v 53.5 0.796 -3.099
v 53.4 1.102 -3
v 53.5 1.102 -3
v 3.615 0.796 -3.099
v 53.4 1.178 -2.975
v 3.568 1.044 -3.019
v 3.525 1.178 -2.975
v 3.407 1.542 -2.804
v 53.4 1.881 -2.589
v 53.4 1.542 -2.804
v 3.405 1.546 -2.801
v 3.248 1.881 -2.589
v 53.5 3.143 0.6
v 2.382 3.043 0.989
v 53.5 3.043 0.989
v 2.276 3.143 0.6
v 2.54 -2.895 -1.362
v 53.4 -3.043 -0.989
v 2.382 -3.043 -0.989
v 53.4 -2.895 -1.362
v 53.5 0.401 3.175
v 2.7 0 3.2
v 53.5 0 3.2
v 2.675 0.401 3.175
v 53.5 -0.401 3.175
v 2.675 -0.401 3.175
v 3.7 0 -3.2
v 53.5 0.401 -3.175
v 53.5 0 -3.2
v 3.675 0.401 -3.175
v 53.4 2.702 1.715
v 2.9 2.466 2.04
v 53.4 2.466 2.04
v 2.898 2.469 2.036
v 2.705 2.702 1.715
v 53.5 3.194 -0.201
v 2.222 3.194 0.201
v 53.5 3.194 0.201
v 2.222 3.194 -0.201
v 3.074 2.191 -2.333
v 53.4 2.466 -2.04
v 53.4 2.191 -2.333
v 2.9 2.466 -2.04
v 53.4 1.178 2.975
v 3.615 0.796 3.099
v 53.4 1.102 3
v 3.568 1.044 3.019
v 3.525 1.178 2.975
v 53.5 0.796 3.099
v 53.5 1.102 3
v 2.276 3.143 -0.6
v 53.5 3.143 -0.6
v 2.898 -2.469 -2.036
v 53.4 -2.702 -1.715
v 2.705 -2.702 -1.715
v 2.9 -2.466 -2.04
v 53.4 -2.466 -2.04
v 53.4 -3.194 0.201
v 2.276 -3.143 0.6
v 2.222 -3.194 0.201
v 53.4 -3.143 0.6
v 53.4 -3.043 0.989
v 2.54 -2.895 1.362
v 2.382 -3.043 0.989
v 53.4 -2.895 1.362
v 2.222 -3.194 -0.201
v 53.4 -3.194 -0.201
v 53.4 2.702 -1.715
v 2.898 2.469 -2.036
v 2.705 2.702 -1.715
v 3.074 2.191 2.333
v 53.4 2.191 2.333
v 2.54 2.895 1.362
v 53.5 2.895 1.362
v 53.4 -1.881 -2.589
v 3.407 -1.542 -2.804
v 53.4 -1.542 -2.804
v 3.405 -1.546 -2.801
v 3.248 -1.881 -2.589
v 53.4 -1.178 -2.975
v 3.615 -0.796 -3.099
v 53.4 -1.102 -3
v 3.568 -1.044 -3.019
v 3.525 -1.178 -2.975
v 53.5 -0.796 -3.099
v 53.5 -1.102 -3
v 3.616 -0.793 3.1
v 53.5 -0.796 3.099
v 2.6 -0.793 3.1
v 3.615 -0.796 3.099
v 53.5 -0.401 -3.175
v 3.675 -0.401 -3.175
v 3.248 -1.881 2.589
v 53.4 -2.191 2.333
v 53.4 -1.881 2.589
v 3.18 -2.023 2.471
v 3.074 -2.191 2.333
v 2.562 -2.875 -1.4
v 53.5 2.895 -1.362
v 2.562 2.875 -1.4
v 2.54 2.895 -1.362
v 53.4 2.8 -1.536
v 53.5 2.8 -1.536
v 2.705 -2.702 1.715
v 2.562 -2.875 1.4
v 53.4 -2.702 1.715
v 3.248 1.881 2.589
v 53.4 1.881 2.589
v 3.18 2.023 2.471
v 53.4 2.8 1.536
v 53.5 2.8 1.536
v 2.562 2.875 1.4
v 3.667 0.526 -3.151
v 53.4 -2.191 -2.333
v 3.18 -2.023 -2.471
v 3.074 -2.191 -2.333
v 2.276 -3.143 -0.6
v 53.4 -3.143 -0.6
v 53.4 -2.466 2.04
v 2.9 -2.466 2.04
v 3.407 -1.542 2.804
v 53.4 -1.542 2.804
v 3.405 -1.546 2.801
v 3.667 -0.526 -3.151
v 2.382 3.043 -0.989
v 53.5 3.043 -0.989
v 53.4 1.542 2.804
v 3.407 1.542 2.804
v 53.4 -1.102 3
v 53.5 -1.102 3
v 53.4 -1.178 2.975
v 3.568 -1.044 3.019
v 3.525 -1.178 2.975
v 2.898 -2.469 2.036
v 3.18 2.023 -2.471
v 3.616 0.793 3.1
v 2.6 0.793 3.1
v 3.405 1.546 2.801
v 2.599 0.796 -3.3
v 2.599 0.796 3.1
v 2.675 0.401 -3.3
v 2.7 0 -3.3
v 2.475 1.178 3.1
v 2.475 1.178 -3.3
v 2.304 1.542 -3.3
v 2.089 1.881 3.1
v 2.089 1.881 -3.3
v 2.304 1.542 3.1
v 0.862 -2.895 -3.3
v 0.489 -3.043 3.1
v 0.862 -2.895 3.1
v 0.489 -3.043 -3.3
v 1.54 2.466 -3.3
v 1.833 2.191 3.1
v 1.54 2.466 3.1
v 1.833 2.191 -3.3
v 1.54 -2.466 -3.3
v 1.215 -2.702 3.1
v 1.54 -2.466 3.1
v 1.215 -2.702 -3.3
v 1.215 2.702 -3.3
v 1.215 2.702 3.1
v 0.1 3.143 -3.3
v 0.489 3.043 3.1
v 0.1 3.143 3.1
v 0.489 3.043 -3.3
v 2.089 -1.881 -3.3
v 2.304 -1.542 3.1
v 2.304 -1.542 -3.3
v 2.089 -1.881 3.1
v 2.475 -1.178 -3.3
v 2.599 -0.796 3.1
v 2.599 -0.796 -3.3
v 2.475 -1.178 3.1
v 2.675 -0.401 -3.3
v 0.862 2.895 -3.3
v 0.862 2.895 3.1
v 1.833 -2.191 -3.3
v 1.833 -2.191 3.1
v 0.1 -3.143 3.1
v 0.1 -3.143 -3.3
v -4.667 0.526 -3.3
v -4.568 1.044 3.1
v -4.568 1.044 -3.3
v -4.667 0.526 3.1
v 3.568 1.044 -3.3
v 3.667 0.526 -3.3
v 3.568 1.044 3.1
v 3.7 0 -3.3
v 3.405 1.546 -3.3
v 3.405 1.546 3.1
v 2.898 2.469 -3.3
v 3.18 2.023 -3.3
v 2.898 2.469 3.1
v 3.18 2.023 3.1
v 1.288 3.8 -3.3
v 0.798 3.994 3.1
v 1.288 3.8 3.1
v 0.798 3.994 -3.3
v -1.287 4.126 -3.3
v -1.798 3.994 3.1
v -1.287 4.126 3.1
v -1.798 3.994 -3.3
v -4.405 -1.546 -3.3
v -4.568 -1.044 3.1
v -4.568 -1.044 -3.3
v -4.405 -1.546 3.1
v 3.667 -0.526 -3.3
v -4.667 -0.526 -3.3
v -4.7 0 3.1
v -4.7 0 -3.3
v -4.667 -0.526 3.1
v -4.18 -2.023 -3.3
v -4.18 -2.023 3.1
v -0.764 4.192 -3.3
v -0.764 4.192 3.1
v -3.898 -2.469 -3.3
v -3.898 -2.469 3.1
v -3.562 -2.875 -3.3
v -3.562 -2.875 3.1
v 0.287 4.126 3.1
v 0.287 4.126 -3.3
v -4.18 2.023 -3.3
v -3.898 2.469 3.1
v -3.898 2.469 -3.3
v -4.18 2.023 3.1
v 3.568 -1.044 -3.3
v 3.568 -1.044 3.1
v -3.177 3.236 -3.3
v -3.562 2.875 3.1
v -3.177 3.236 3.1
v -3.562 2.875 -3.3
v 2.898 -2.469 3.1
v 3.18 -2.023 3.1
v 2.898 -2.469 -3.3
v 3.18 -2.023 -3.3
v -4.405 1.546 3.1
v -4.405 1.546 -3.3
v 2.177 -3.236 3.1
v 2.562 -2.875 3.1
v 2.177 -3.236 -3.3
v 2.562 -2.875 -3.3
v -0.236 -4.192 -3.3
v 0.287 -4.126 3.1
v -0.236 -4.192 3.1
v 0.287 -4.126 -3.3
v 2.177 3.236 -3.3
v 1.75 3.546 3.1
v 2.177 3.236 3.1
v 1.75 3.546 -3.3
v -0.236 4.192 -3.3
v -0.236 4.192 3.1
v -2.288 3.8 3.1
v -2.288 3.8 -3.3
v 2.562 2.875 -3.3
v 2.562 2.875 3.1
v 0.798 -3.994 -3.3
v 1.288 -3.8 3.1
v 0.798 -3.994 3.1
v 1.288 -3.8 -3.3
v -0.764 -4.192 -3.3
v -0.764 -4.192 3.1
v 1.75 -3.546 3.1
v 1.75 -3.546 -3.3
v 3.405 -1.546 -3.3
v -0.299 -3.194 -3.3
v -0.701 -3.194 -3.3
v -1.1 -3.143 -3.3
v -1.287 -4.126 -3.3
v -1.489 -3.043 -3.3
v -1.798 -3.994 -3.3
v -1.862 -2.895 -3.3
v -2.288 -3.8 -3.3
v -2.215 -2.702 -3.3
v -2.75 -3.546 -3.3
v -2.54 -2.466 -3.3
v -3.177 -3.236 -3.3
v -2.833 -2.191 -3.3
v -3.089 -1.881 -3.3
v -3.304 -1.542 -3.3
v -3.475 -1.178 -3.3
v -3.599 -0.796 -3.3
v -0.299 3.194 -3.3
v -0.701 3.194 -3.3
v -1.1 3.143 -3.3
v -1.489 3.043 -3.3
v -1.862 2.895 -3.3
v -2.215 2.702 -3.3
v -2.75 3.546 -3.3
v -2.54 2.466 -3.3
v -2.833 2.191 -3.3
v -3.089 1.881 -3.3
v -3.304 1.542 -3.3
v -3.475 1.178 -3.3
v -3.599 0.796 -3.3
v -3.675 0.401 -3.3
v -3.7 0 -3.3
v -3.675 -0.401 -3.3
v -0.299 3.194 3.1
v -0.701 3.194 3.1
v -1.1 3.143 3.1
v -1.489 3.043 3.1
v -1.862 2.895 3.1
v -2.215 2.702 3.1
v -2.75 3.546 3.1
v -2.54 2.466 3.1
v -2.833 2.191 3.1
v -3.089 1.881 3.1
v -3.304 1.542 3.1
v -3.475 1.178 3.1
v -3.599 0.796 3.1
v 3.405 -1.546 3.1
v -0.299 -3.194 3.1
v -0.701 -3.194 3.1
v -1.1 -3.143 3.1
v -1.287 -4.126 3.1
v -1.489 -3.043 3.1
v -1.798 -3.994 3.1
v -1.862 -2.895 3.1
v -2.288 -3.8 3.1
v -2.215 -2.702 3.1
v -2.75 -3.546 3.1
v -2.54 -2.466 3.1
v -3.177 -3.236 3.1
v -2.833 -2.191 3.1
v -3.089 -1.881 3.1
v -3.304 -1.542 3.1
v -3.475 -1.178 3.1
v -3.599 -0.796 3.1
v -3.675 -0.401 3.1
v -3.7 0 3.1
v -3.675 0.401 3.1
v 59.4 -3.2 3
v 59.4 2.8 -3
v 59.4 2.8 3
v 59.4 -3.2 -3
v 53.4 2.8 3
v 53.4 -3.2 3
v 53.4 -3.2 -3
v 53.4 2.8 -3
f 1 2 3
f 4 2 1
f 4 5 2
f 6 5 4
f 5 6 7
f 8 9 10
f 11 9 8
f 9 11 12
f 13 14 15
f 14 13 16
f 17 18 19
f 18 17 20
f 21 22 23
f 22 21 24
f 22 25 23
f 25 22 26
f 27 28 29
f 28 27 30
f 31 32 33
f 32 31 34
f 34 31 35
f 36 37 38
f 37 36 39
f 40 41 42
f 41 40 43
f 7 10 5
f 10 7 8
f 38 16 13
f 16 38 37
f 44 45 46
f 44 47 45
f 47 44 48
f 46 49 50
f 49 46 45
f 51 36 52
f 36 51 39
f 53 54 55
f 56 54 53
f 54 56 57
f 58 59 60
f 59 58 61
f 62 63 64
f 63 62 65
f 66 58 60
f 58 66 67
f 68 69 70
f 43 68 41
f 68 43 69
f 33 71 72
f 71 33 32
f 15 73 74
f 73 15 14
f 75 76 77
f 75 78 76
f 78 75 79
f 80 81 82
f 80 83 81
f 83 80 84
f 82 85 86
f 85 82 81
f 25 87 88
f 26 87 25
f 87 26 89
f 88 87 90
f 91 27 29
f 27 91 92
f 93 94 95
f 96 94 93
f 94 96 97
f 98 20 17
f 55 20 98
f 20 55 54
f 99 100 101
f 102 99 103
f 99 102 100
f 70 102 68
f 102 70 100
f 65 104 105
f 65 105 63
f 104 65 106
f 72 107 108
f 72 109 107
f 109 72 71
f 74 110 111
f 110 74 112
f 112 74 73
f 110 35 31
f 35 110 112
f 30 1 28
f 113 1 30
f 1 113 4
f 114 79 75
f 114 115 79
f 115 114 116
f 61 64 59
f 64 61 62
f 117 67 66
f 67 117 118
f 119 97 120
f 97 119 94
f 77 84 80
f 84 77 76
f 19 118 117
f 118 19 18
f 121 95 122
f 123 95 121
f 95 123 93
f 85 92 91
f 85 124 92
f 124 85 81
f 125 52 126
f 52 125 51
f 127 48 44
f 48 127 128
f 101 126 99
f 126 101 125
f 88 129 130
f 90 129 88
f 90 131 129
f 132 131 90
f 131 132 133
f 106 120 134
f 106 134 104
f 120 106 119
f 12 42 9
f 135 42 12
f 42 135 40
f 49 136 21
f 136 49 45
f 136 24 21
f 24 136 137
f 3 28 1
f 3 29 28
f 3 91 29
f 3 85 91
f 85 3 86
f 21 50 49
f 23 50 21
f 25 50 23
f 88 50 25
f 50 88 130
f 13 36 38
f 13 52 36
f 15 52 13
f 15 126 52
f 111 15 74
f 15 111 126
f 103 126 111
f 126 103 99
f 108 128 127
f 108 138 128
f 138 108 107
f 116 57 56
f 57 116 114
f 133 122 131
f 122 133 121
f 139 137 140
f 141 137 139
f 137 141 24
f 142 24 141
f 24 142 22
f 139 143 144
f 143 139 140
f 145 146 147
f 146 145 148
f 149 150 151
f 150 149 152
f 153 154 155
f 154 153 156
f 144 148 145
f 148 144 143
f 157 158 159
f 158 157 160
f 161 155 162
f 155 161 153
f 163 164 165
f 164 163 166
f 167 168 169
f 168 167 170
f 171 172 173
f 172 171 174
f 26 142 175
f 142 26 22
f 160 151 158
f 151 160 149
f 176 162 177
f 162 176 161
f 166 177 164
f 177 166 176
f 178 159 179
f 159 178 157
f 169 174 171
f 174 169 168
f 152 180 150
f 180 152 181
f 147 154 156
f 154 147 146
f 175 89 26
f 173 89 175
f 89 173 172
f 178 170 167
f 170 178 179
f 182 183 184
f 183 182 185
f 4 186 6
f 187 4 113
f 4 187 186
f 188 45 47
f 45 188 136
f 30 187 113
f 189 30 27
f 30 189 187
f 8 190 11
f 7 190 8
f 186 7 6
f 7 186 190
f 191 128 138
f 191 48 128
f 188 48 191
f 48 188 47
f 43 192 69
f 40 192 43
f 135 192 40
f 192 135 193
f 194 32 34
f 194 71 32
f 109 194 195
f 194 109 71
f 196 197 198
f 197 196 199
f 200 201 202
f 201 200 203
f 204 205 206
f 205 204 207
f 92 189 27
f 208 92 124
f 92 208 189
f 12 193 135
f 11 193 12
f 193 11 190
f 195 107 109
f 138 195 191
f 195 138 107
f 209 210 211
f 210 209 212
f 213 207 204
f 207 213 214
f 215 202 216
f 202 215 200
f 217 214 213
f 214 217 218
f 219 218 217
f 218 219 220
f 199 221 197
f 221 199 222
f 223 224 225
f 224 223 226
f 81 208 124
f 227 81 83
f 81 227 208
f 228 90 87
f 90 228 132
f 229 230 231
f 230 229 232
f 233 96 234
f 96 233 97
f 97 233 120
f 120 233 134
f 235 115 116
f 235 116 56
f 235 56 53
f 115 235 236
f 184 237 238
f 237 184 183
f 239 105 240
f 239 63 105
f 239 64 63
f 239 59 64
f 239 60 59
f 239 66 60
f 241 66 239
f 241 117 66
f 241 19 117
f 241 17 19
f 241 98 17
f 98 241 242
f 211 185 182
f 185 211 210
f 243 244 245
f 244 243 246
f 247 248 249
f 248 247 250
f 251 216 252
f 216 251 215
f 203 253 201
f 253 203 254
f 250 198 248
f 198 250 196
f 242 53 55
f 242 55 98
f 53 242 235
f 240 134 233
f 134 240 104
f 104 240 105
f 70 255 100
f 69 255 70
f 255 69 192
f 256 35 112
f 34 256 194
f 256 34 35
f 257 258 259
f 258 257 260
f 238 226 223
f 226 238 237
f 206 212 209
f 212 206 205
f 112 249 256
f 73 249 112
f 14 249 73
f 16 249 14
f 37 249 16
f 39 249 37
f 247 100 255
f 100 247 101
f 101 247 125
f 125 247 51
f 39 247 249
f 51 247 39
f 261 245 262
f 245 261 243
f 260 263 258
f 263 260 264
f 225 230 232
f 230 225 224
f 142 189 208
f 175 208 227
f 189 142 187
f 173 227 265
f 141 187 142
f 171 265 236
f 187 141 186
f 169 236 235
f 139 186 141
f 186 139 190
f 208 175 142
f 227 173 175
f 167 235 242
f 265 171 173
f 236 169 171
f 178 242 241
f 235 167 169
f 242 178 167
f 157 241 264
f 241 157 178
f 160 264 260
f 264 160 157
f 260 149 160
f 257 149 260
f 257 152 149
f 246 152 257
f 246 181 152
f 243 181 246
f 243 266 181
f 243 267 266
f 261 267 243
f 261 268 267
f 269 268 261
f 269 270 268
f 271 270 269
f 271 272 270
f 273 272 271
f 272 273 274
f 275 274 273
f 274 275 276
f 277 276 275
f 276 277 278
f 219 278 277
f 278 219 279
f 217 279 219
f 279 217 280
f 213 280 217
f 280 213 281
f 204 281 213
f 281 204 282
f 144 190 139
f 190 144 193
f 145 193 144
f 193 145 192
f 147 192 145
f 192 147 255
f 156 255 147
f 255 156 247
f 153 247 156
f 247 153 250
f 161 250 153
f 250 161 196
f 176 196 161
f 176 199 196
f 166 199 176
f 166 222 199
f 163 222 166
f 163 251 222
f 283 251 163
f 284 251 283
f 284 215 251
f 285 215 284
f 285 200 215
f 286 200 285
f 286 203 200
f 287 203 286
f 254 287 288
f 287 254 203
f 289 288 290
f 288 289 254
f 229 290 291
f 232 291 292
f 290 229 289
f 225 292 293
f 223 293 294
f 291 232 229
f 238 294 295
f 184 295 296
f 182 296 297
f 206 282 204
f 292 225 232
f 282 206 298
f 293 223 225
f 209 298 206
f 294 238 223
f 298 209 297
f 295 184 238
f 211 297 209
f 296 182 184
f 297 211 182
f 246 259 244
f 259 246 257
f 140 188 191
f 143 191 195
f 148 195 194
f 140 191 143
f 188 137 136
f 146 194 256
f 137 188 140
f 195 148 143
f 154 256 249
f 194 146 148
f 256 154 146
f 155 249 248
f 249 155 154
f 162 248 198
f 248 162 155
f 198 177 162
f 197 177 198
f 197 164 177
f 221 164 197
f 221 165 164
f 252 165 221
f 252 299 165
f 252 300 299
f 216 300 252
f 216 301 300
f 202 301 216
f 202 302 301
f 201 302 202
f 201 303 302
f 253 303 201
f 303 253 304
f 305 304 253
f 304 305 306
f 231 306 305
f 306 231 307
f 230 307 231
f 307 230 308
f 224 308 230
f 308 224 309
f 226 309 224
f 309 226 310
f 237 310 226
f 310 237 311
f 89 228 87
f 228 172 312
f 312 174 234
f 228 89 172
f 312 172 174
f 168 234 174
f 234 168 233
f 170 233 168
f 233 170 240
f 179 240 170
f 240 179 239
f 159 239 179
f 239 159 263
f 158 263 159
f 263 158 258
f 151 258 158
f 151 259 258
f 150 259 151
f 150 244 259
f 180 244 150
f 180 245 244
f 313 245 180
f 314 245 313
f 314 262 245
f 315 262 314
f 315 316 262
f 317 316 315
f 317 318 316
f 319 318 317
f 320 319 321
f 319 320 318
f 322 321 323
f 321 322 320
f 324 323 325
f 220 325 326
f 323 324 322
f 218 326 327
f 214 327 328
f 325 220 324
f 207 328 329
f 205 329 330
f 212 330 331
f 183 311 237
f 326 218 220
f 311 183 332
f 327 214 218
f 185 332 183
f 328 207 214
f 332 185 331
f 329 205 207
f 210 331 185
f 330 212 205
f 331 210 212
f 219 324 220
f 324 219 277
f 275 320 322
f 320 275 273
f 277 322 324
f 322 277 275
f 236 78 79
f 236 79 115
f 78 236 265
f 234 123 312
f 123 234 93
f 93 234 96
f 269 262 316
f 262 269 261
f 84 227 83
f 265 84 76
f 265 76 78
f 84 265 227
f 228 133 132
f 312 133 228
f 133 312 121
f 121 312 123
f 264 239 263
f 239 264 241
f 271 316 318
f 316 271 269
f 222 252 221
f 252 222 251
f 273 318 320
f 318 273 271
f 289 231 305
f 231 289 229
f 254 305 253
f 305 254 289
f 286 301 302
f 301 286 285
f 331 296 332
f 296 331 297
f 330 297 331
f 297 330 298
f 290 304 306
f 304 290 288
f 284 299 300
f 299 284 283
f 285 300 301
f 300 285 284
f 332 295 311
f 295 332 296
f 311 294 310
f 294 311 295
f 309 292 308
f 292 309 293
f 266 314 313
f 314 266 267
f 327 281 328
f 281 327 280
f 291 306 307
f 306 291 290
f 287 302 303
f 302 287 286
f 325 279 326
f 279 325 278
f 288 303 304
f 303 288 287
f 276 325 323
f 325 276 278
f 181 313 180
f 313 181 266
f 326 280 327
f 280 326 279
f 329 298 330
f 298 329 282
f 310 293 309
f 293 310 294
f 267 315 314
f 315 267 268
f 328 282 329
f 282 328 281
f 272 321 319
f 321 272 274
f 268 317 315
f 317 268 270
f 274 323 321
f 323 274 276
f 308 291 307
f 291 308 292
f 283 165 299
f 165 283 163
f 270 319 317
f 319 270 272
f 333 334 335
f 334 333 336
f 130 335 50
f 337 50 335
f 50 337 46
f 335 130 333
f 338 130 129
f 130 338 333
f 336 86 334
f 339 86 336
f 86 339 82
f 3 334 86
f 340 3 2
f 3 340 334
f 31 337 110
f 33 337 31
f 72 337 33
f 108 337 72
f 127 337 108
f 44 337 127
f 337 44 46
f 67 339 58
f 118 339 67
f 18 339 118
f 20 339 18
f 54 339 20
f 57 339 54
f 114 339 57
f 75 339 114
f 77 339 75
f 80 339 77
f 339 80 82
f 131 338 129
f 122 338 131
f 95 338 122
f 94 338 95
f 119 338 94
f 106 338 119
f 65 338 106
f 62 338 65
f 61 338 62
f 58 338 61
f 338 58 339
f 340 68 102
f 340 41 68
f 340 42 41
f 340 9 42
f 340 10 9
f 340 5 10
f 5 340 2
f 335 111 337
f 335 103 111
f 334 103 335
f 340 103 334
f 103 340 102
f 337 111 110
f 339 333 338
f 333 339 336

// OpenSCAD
// file: ../robot_settings.scad
main_box_x = 95; // 96
main_box_y = 102;
main_box_z = 74; // 74.5
wall_thickness = 2;

rail_gap = 2;
rail_inset = 7;

rail_thickness = 7;
rail_length = 250;
rail_width = 200;

raspberry_pi_screw_seperation_y = 57;
raspberry_pi_screw_seperation_z = 48;
raspberry_pi_peg_h = 4;

gears_module = 1;
pinion_gear_teeth = 30;
pinion_gear_width = 5;
pinion_gear_bore = 4;

gears_setback_distance = 25;
gear_post_height = 2 * pinion_gear_width + rail_thickness + 8 ;

steering_motor_mount_x = 45;
steering_motor_mount_y = 36;
steering_motor_mount_z = 18;
steering_motor_mount_setback_distance = gears_setback_distance + 16;

dc_motor_drivertype = "Teyleten"; // Teyleten
isAdafruit = (dc_motor_drivertype == "Adafruit");

drv8871_x = isAdafruit ? 20.3 : 21.6;
drv8871_y = isAdafruit ?  24 : 25;

drv8871_z = 2;
drv8871_screw_d = 2.5;
drv8871_solder_points_z = 2;

drv8871mount_edge_x = 1.5;
drv8871mount_edge_wall = 3;
drv8871mount_z = 5;
drv8871mount_x = drv8871_x +  drv8871mount_edge_wall - 2* drv8871mount_edge_x;
drv8871mount_y = 19;

drv8871_screw_distance = 15.64;
drv8871_solder_points_d = 1.66;
drv8871_solder_offset_y = 4.4;
drv8871_solder_inner_points_distance = 5;
drv8871_solder_outer_points_distance = 12;

dc_motor_housing_minus_encoder_z = 48;
dc_motor_encoder_z = 9.33;
dc_motor_encoder_wheel_d = 13.4;
dc_motor_encoder_wheel_thickness = 5;
dc_motor_encoder_wheel_gap = 3;
dc_motor_encoder_circuit_thickness = 2;
dc_motor_cutout_d = 24.8;
dc_motor_cutout_z = 19.5;

dc_motor_screw_head_z = 2;
dc_motor_screw_head_d = 5.6;
dc_motor_screw_d = 3.2;
dc_motor_screw_offset = 8.5;

dc_motor_axle_ring_z = 3;
dc_motor_axle_ring_d = 7.2;
dc_motor_axle_cutout_d = 4.5;
dc_motor_axle_cutout_z = 10;
dc_motor_axle_notch_cutout = 0.4;
dc_motor_axle_notch_cutout_z = 6;

pdmount_x = 20;
pdmount_y = 30;
pdmount_z = 2;
pdmount_edge_x = 1.5;
pdmount_edge_wall = 3;

steering_shaft_z = 45;
steering_shaft_d = 7;
steering_shaft_motor_fitting_d = 9;
coupler_length = 24.6;
coupler_diameter = 14;
coupler_screw_d = 4;
coupler_screw_z_offset = 5;
coupler_gear_side_insert = 12.6;
steering_shaft_with_coupler_z = steering_shaft_z - coupler_gear_side_insert;

lidar_mount_y = 110;
lidar_mount_x = 65 + 20;
lidar_narrow_screws = 40;
lidar_wide_screws = 56;
lidar_front_to_back_screws = 70;
lidar_screw_d = 3;
lidar_circuitboard_x = 20;
lidar_circuitboard_y = 35;
lidar_circuitboard_z = 1.2;
lidar_cord_length = 29;

ball_bearing_height = 7;
ball_bearing_outer_diameter = 22;
ball_bearing_inner_diameter = 8;

 armature_holder_height = 20;
 armature_holder_thickness = 8;
pull_bar_peg_r = 3.2;
apparatus_locking_peg_d = 4;

rack_module = 1;
rack_length = main_box_x / 2;
rack_height = 10;
rack_width = 10;
rack_teeth = 30;
rack_bore = 3;

pull_bar_length = rail_width / 2 - rack_length + 1;

// tire hardware
axle_length = 30;
axle_reciever_inner_diameter = 7.75;
axle_reciever_length = 18.8;
axle_notch_length = 7;
axle_notch_cutout = 2.4;

// power distribution bar
power_bar_cutout_x = 96;
power_bar_y = 19.1;
power_bar_z = 1.5;
power_bar_screw_distance = 91.4;
power_bar_screw_d = 2.8;
power_bar_standoff_z = 5;
power_bar_standoff_d = 6.83;

// breadboard
breadboard_wall_thickness = 3;
breadboard_width = 55;
breadboard_length = 83;
breadboard_height = 10.5;
breadboard_notch_width = 3.8;
breadboard_longside_notch_separation = 58.2 - breadboard_notch_width / 2;
breadboard_shortside_notch_separation = 26.3 - breadboard_notch_width;

pico_expander_width = 63;
pico_expander_height = 57;
pico_screw_hole_offset = 3;
pico_screw_hole_d = 2.5;
// main file
include <../robot_settings.scad>
$fn = 50;

module pull_bar(rotate = false) {
  rotation = rotate ? 180 : 0;
  
  rotate([0,rotation,0])
  {
      // push bar
      difference() {
          rotate([0, 90, 0])
          cylinder(h = pull_bar_length, r = pull_bar_peg_r);
          translate([-.5, 0, -pull_bar_peg_r])
          cylinder(h = 2 * pull_bar_peg_r, r = pull_bar_peg_r);
        }
        
        // rack fitting
        translate([pull_bar_length - .1, -pull_bar_peg_r, -pull_bar_peg_r + .2])
        cube(2 * pull_bar_peg_r - .4);

        // grabber
      translate([-.5, 0, -1.1])
      difference() {
            translate([0, 0, 1 - pull_bar_peg_r])
            cylinder(h = 2 * pull_bar_peg_r, r = pull_bar_peg_r + 1);
        
            translate([0, 0,  -pull_bar_peg_r])
            cylinder(h = 3* pull_bar_peg_r, r = pull_bar_peg_r);
          }
  }
}
pull_bar();
